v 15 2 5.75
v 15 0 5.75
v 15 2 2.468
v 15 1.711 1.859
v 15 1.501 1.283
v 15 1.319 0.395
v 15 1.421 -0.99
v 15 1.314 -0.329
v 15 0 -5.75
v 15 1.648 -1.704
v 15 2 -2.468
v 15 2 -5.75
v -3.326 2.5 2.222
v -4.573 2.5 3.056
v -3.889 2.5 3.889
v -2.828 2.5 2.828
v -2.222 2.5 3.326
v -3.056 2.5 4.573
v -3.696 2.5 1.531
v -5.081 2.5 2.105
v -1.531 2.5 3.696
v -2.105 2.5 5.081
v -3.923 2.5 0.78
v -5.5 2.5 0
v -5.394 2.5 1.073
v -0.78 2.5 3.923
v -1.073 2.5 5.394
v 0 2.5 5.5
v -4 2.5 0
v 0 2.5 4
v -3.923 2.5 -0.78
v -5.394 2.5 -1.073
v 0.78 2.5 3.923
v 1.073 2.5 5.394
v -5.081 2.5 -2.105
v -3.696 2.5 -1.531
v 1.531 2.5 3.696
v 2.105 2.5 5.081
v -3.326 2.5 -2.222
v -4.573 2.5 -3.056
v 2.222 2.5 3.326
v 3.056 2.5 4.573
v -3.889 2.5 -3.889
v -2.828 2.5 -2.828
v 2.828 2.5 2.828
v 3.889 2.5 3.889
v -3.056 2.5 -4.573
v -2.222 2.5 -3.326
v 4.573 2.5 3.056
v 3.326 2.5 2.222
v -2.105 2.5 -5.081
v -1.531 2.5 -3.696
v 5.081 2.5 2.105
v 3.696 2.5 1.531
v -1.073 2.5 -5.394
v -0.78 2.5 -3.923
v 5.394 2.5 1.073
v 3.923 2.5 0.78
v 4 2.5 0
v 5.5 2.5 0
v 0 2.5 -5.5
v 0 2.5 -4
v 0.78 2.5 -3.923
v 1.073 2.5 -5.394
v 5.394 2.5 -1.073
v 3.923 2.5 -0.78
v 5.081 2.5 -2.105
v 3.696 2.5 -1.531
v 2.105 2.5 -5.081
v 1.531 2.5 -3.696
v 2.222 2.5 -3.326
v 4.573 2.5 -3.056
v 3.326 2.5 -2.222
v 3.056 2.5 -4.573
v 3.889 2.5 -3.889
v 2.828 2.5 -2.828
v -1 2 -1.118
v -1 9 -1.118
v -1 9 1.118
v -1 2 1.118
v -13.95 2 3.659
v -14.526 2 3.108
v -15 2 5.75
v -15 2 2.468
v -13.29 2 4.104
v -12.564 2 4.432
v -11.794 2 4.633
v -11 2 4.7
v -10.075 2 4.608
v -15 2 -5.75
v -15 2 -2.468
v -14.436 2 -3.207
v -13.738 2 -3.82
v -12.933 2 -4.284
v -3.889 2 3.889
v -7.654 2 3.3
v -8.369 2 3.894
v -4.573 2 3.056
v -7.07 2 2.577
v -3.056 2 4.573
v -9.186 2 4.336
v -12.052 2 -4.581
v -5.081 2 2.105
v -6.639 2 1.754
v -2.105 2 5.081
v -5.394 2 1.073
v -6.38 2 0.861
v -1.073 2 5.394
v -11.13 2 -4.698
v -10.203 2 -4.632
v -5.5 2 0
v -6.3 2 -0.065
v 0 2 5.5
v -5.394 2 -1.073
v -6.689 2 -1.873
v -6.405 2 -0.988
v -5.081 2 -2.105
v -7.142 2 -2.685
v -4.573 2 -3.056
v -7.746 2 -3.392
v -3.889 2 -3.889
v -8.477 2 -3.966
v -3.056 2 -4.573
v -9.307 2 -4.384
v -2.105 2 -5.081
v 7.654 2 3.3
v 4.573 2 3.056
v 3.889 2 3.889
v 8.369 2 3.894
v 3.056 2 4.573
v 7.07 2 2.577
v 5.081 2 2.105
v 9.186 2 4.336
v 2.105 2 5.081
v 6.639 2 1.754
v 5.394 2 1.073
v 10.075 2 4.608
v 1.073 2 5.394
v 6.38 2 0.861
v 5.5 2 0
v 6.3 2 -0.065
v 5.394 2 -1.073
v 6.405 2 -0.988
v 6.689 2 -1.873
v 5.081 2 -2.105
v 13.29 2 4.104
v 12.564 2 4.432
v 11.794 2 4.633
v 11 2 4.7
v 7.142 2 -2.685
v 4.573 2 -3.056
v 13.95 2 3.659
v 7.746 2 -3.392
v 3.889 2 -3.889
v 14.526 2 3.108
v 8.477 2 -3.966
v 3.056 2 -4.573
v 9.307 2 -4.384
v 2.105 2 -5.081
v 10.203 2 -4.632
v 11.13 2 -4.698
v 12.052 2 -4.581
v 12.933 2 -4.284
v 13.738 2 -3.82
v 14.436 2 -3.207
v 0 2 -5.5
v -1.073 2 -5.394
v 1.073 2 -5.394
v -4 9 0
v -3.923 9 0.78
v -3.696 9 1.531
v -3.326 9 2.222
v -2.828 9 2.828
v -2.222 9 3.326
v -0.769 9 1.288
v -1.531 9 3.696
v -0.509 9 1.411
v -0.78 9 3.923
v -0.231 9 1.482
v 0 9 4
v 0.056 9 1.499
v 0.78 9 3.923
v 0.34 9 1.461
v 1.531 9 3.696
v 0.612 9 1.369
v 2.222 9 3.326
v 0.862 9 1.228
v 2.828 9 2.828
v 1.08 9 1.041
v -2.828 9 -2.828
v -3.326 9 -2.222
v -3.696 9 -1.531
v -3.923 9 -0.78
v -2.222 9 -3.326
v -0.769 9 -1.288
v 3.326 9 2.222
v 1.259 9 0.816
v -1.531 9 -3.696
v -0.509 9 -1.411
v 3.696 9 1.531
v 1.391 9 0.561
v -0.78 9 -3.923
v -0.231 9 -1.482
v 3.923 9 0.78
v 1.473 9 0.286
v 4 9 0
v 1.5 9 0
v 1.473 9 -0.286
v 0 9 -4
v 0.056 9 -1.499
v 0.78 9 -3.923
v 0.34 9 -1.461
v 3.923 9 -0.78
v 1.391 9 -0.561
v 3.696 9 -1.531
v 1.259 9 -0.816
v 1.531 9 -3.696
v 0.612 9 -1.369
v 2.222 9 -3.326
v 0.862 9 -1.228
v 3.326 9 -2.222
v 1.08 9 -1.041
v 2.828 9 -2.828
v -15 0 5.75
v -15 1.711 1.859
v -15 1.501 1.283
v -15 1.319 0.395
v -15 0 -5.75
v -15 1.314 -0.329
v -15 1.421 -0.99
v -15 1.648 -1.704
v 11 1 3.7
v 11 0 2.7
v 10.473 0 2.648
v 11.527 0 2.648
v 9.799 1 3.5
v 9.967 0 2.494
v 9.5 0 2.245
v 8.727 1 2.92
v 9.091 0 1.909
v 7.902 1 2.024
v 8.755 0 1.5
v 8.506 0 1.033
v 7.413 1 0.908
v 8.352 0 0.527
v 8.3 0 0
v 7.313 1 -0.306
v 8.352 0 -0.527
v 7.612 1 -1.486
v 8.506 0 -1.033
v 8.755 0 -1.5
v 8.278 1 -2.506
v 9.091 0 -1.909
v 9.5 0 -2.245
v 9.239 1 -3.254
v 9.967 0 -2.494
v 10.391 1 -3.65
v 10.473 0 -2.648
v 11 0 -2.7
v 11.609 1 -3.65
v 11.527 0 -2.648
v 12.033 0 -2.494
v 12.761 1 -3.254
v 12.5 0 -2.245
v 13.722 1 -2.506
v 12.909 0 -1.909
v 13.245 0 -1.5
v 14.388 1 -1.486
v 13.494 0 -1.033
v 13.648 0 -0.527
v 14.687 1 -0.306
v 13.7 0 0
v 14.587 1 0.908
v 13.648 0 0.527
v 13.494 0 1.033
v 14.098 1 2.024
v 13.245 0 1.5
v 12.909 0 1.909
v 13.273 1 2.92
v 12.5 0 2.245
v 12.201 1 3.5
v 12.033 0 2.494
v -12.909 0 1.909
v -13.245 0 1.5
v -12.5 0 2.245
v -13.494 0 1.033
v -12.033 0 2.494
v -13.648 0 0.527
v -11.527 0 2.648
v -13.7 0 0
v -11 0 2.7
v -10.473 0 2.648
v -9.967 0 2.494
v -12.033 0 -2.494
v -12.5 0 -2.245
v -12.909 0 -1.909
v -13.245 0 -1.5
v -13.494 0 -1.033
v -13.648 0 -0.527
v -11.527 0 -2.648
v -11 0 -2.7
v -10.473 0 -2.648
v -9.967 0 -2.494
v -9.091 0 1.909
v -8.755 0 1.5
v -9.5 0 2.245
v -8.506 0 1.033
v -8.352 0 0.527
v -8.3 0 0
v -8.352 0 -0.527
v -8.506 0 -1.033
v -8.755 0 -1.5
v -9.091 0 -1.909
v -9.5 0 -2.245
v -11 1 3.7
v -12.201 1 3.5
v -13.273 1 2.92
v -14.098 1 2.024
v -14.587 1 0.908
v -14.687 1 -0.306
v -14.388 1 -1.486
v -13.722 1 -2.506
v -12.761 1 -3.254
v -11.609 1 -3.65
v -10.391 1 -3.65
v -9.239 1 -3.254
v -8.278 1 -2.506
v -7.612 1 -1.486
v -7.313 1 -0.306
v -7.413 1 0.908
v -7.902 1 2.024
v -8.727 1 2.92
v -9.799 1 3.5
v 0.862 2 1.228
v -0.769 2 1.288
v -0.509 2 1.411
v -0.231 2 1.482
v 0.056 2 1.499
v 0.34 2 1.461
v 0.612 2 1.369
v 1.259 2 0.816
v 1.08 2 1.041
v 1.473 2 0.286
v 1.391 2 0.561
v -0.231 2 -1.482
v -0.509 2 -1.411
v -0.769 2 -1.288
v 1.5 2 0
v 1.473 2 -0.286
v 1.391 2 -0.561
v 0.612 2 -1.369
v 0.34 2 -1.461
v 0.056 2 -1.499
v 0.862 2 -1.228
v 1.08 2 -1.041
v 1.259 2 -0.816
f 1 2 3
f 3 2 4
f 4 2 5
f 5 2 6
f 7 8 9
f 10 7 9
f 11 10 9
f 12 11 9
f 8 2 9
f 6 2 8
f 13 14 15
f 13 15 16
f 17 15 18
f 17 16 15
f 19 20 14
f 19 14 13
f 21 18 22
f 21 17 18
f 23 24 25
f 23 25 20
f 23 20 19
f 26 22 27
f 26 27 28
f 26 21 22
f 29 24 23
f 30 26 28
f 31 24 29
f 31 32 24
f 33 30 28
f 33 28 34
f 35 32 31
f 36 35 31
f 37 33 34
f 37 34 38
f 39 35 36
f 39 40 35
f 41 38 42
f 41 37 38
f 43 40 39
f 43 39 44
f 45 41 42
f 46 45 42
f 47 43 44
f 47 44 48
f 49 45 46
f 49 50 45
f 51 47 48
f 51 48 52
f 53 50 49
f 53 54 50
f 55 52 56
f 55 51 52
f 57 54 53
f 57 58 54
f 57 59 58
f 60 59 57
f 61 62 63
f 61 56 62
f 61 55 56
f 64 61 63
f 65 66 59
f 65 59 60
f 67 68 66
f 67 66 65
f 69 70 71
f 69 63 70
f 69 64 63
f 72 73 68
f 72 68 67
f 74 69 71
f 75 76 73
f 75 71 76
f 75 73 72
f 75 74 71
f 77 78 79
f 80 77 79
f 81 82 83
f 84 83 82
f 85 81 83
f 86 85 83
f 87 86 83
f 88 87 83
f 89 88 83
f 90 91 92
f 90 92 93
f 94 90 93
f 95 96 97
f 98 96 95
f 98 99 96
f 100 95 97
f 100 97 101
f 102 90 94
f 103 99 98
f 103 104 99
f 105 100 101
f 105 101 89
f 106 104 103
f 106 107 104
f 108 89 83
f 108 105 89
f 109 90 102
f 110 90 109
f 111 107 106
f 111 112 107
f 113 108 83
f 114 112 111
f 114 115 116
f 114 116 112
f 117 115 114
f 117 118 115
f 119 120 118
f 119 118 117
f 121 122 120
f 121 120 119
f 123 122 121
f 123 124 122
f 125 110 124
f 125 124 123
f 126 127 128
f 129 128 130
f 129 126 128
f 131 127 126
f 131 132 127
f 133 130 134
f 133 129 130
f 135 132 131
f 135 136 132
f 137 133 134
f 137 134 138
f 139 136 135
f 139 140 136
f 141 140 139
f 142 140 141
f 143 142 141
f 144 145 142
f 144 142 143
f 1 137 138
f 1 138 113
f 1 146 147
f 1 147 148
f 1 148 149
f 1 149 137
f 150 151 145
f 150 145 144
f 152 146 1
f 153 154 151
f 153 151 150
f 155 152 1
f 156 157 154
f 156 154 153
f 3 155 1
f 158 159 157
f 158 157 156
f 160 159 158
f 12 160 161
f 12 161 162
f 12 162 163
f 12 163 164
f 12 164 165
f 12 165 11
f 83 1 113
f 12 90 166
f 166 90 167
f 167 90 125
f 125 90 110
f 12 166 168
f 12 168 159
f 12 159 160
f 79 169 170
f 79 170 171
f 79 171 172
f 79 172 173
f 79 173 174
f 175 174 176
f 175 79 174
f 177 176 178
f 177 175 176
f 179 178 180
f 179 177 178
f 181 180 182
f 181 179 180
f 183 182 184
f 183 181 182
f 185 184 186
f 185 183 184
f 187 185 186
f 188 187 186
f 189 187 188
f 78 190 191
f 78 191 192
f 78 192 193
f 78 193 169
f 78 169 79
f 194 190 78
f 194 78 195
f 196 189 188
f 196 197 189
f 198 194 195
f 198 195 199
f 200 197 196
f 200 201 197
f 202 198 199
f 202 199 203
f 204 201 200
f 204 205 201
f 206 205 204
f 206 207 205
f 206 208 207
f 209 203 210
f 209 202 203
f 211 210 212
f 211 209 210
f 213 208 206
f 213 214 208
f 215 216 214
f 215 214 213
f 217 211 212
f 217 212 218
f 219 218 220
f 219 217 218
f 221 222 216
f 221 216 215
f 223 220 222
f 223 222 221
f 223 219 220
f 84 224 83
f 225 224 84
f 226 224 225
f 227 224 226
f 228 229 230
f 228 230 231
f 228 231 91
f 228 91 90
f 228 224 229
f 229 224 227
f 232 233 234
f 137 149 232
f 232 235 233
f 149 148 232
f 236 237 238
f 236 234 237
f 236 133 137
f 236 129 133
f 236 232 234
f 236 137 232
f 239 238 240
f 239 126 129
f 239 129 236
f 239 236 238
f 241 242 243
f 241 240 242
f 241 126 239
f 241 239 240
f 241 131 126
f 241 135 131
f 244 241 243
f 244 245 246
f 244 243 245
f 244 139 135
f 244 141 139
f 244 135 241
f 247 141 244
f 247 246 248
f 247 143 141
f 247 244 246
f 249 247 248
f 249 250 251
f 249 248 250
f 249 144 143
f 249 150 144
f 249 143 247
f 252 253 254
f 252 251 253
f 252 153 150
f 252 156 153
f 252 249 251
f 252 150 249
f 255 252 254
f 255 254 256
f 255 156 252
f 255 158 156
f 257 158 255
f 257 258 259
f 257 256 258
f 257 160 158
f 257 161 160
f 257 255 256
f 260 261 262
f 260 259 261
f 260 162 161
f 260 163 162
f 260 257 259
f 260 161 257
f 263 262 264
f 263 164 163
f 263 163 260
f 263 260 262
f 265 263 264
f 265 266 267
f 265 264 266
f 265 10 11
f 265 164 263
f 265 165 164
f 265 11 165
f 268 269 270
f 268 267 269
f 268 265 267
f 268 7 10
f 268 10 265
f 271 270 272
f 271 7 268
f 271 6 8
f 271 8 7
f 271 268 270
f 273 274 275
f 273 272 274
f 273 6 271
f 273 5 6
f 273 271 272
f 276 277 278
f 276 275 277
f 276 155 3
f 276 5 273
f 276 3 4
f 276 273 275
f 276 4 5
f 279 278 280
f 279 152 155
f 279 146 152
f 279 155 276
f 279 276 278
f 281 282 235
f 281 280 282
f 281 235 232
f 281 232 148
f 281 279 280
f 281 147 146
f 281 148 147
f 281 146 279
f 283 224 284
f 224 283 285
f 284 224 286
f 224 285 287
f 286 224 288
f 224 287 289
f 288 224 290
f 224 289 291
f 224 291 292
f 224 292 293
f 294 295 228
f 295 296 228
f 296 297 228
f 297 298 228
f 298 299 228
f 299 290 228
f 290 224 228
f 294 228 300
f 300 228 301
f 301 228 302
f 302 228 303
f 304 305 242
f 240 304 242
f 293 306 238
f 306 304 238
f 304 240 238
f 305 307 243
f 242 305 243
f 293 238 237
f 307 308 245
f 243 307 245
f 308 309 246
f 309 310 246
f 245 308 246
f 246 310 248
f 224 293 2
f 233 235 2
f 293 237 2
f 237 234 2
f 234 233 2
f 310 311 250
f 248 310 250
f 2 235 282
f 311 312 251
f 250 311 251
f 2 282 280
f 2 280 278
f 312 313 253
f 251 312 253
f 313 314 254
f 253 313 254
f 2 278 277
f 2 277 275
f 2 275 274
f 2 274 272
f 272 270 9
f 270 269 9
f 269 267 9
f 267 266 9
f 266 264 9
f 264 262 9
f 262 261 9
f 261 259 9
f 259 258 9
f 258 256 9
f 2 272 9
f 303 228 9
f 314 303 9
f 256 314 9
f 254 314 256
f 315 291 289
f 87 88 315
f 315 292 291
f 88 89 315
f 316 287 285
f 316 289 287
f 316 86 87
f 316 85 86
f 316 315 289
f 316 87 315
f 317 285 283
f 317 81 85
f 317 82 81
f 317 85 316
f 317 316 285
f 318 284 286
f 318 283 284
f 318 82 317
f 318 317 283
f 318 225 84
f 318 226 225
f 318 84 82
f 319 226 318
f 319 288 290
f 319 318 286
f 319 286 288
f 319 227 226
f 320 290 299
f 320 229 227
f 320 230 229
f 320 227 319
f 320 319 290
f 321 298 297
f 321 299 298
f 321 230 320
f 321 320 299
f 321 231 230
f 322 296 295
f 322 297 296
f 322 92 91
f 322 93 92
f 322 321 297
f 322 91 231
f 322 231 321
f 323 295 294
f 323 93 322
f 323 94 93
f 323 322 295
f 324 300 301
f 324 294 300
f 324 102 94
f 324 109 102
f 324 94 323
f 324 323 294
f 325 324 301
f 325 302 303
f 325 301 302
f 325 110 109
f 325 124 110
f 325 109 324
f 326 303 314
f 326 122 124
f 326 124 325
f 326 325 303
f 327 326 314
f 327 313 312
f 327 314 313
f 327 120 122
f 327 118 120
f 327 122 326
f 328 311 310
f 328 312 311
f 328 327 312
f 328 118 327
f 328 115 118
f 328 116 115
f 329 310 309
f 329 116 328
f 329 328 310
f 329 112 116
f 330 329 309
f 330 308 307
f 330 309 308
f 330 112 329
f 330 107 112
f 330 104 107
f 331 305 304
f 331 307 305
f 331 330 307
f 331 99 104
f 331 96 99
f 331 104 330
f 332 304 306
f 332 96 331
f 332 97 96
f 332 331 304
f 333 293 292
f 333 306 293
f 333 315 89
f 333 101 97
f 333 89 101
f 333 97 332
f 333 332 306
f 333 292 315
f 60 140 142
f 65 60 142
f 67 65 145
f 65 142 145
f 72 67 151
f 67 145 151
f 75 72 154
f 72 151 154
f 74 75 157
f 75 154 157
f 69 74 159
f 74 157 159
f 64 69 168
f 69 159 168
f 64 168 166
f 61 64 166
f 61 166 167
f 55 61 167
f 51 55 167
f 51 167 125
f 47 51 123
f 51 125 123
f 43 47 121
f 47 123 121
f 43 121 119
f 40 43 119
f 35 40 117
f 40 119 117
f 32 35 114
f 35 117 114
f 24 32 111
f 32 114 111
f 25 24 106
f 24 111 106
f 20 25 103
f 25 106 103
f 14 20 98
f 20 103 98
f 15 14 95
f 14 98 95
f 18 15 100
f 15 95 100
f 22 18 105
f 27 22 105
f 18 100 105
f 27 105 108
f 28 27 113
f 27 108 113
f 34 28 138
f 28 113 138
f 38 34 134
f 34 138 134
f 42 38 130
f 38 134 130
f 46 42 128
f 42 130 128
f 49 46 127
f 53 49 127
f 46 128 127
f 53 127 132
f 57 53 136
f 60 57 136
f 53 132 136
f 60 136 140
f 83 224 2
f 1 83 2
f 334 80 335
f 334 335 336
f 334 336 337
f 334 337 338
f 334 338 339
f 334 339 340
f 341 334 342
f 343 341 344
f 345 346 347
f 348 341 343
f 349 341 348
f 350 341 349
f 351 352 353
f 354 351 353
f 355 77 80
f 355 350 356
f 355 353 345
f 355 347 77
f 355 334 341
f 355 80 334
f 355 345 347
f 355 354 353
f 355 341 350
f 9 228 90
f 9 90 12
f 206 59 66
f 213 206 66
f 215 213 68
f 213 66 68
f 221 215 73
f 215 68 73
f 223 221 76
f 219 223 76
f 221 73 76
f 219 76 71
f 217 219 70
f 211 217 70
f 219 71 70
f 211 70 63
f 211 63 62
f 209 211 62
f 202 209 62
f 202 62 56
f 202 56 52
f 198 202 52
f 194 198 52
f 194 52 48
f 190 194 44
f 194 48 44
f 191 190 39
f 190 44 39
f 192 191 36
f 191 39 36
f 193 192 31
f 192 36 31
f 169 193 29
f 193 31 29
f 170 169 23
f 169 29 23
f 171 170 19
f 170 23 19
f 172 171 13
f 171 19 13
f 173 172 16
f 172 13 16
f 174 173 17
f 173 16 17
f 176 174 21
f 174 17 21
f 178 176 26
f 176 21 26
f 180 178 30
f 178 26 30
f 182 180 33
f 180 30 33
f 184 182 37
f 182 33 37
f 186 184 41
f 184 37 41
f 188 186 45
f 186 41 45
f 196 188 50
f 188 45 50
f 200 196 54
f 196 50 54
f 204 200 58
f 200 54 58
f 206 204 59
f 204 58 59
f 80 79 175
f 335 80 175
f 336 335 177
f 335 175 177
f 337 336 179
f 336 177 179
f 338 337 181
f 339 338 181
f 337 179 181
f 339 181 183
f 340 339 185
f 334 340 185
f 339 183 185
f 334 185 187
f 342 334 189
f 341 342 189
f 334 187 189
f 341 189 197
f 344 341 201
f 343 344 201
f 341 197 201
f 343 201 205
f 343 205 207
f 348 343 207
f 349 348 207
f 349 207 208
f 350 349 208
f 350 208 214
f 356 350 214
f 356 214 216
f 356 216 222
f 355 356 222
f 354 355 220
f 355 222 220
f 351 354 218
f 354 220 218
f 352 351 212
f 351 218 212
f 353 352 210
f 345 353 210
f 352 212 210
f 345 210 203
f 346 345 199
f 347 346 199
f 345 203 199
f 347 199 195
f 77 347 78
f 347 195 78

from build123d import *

# Parameters (mm, degrees)
SKETCH1_W                                    = 30
SKETCH1_H                                    = 11.5
BOSS_EXTRUDE1_DEPTH                          = 2
SKETCH2_R                                    = 5.5
BOSS_EXTRUDE2_DEPTH                          = 0.5
SKETCH3_R                                    = 4
BOSS_EXTRUDE3_DEPTH                          = 6.5
CUT_EXTRUDE1_DEPTH                           = 7
CSK_FOR_M4_COUNTERSUNK_FLAT_HEAD_SCR_2_COUNT = 2
CSK_FOR_M4_COUNTERSUNK_FLAT_HEAD_SCR_2_PITCH = 22


with BuildPart() as part:
    # Sketch1 → Boss-Extrude1 (new body)
    with BuildSketch(Plane(origin=(0, 0, 0), x_dir=(1, 0, 0), z_dir=(0, 1, 0))):
        Rectangle(SKETCH1_W, SKETCH1_H)
    extrude(amount=BOSS_EXTRUDE1_DEPTH)

    # Sketch2 → Boss-Extrude2 (add)
    with BuildSketch(Plane(origin=(0, 2, 0), x_dir=(1, 0, 0), z_dir=(0, 1, 0))):
        Circle(SKETCH2_R)
    extrude(amount=BOSS_EXTRUDE2_DEPTH)

    # Sketch3 → Boss-Extrude3 (add)
    with BuildSketch(Plane(origin=(0, 2.5, 0), x_dir=(1, 0, 0), z_dir=(0, 1, 0))):
        Circle(SKETCH3_R)
    extrude(amount=BOSS_EXTRUDE3_DEPTH)

    # Sketch4 → Cut-Extrude1 (cut)
    with BuildSketch(Plane(origin=(0, 9, 0), x_dir=(1, 0, 0), z_dir=(0, 1, 0))):
        with BuildLine():
            Line((-1, 1.118033989), (-1, -1.118033989))
            ThreePointArc((-1, -1.118033989), (1.5, 0), (-1, 1.118033989))
        make_face()
    extrude(amount=-CUT_EXTRUDE1_DEPTH, mode=Mode.SUBTRACT)

    # Sketch6 → CSK for M4 Countersunk Flat Head Screw1 (revolve, cut)
    with BuildSketch(Plane(origin=(11, 2, 0), x_dir=(0, 0, 1), z_dir=(1, 0, 0))):
        Polygon((0, 0), (0, 3.351936393), (2.25, 2), (2.25, 2.45), (4.7, 0), align=None)
    csk_for_m4_countersunk_flat_head_screw1 = revolve(axis=Axis((11, 8.35, 0), (0, -1, 0)), mode=Mode.SUBTRACT)

    # CSK for M4 Countersunk Flat Head Scr 2: CSK for M4 Countersunk Flat Head Screw1 ×2
    with Locations(*[(-i * CSK_FOR_M4_COUNTERSUNK_FLAT_HEAD_SCR_2_PITCH, 0, 0) for i in range(1, CSK_FOR_M4_COUNTERSUNK_FLAT_HEAD_SCR_2_COUNT)]):
        add(csk_for_m4_countersunk_flat_head_screw1, mode=Mode.SUBTRACT)


solid = part.part
